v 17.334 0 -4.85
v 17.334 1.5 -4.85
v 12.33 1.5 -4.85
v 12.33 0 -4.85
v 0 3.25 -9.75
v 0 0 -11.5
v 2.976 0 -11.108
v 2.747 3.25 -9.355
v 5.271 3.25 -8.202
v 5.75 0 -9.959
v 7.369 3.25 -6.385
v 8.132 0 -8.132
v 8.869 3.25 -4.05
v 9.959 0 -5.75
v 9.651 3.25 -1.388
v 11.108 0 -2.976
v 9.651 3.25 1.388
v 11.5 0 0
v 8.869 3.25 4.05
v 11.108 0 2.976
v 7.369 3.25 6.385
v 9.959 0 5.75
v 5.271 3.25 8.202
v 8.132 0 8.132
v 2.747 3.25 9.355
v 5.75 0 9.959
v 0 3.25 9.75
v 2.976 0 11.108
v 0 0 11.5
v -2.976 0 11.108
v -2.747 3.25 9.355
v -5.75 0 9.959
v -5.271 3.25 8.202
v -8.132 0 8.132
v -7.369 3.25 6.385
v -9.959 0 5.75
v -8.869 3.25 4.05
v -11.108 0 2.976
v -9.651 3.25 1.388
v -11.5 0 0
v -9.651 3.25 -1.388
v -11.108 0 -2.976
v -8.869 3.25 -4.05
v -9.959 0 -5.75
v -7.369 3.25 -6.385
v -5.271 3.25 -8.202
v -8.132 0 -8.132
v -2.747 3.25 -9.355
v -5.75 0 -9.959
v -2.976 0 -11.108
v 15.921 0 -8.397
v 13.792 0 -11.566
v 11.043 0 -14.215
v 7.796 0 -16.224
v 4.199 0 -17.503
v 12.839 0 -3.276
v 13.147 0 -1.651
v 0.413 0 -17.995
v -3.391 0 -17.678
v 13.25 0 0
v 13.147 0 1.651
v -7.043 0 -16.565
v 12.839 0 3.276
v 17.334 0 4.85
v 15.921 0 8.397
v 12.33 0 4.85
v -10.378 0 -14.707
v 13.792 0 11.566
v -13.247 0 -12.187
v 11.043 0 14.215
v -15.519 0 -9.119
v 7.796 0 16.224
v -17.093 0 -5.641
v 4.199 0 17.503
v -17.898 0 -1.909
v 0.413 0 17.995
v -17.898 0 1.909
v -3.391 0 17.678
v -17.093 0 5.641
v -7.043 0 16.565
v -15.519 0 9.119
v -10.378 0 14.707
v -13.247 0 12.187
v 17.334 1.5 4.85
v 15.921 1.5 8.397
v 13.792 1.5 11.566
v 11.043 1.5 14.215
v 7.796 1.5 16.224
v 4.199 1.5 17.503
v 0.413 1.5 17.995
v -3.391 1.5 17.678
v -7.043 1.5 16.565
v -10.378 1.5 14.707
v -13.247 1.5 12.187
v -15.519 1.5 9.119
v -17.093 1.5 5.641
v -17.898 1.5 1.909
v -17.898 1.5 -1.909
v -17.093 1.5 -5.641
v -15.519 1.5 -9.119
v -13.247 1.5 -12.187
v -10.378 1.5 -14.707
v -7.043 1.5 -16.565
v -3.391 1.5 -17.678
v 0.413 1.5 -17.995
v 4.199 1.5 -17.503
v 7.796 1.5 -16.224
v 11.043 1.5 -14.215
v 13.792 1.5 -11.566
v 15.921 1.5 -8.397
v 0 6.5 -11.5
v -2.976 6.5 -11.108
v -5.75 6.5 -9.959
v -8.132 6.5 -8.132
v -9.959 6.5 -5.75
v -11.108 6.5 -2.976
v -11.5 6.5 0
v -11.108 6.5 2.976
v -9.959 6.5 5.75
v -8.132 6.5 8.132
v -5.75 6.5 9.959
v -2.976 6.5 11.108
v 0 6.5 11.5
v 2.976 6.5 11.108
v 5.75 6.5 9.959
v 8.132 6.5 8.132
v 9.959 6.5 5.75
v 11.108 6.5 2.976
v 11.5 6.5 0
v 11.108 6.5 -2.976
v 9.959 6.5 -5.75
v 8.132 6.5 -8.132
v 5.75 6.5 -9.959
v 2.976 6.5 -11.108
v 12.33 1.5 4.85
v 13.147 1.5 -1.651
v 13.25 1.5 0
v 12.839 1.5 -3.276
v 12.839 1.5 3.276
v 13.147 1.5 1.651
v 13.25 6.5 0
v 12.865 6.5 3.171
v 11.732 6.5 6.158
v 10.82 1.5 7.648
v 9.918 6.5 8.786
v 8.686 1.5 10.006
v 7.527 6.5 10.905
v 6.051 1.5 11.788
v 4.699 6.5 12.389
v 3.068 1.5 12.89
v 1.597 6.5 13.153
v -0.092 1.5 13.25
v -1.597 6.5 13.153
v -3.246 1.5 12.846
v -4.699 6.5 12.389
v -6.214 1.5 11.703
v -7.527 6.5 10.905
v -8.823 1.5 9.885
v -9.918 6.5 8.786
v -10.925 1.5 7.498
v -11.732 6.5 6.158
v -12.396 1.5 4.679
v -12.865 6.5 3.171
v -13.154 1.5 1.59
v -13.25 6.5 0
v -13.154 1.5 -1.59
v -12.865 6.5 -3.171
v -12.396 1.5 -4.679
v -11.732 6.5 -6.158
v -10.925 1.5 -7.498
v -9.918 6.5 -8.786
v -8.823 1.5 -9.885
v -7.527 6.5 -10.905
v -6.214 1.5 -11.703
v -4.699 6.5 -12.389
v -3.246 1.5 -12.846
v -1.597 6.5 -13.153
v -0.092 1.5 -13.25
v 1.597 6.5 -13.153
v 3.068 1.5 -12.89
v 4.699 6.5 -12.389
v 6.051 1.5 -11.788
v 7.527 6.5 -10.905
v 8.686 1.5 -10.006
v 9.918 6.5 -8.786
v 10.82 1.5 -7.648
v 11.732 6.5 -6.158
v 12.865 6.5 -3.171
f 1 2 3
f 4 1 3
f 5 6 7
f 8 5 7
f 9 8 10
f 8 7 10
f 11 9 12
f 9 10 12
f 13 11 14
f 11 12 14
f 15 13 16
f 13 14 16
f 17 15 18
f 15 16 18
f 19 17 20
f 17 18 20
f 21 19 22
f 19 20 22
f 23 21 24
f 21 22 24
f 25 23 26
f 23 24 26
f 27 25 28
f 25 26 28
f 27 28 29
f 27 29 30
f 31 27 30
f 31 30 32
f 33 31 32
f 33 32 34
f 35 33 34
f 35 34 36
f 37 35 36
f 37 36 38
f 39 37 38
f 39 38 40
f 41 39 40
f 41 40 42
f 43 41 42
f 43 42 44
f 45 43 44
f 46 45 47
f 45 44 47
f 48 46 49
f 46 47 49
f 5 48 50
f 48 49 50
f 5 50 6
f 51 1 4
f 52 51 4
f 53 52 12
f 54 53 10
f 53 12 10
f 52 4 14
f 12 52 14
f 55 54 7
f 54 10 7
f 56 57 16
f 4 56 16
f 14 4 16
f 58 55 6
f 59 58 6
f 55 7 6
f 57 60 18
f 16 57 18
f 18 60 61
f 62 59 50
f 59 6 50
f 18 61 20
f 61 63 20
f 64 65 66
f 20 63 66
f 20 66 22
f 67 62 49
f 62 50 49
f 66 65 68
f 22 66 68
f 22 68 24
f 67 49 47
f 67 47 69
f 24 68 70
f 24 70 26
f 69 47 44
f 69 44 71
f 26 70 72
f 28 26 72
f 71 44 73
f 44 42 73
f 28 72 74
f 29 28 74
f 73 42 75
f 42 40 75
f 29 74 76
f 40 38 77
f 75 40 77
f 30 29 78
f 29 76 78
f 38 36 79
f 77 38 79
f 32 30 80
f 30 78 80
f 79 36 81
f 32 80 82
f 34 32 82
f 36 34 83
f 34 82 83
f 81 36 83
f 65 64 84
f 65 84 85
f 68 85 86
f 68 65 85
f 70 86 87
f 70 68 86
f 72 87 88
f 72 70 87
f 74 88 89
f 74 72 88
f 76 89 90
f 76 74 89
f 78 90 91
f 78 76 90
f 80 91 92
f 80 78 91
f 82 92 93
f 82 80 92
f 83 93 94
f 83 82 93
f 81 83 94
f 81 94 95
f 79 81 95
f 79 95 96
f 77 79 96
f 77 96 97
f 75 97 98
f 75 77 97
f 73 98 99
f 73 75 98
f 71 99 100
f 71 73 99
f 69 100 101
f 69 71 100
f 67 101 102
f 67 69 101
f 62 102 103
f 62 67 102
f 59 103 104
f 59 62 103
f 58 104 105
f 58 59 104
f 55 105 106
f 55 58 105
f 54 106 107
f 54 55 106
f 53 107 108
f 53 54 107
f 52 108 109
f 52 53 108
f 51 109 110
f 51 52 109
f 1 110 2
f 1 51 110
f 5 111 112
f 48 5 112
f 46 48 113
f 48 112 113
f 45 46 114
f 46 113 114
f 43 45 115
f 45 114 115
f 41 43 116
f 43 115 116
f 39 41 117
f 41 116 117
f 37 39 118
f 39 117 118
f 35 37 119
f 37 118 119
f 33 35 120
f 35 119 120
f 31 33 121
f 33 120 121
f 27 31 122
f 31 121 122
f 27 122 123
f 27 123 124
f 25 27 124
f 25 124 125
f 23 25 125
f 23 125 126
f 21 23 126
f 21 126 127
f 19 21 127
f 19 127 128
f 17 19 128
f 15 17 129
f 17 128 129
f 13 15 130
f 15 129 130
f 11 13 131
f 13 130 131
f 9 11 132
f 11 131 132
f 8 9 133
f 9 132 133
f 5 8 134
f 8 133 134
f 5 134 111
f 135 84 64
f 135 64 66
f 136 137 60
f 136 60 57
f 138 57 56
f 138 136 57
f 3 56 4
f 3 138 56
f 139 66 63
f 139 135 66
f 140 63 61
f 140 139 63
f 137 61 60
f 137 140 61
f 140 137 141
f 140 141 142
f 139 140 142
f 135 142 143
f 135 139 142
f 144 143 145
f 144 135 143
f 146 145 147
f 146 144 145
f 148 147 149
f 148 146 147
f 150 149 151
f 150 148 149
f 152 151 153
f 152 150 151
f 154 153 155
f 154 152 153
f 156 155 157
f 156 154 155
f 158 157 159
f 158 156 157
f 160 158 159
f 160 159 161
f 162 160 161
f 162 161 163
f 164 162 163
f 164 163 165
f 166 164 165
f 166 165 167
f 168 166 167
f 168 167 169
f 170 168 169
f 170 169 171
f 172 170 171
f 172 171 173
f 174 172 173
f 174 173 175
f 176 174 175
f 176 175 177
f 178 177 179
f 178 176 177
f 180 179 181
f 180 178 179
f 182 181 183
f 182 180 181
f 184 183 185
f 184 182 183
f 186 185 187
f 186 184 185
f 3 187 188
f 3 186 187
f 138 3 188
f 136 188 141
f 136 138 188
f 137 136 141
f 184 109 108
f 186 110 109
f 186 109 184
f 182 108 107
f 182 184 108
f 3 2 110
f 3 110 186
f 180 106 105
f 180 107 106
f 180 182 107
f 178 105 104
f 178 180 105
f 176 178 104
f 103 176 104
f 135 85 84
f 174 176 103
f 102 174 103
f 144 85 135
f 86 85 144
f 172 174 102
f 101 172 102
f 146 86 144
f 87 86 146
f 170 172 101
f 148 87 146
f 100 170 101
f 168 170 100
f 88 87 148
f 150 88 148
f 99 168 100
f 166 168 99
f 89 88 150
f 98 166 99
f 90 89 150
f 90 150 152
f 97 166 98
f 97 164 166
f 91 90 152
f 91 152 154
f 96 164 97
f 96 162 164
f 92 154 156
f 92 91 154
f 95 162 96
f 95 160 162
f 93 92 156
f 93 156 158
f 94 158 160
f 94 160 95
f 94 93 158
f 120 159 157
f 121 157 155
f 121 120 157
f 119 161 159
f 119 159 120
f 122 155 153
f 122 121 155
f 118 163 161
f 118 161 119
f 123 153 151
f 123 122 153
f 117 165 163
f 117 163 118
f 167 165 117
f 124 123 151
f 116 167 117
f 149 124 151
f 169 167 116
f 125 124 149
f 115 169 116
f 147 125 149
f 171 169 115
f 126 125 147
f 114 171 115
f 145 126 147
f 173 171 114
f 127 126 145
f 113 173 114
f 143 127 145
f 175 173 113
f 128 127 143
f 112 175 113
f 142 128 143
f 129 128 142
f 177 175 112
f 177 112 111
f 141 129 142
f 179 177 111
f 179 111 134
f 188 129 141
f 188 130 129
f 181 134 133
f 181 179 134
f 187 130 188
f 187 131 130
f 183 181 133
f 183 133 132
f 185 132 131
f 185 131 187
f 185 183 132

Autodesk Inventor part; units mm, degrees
ref_plane "YZ Plane" through (0, 0, 0) normal (1, 0, 0) x (0, 1, 0)
ref_plane "XZ Plane" through (0, 0, 0) normal (0, 1, 0) x (-1, 0, 0)
ref_plane "XY Plane" through (0, 0, 0) normal (0, 0, 1) x (1, 0, 0)
sketch "Boceto1" plane through (0, 0, 0) normal (0, 1, 0) x (-1, 0, 0)
  circle A0 centre (0, 0) radius 18
  circle A1 centre (0, 0) radius 9.75
  dimension "d0" = 36
  dimension "d1" = 19.5
extrude "Extrusión1" add sketch "Boceto1" along normal blind 1.5
sketch "Boceto2" plane through (0, 1.5, 0) normal (0, 1, 0) x (1, 0, 0)
  circle A0 centre (0, 0) radius 9.75
  circle A1 centre (0, 0) radius 13.25
  dimension "d4" = 26.5
extrude "Extrusión2" add sketch "Boceto2" along normal blind 5
sketch "Boceto3" plane through (0, 1.5, 0) normal (0, 1, 0) x (1, 0, 0)
  circle A0 centre (0, 0) radius 18 projected
  line L0 (18, 0) -> (18, -4.85)
  line L1 (18, -4.85) -> (12.3305, -4.85)
  circle A1 centre (0, 0) radius 13.25 projected
  line L2 (18, 0) -> (18, 4.85)
  line L3 (18, 4.85) -> (12.3305, 4.85)
  point P0 (17.3343, 4.85)
  point P1 (17.3343, -4.85)
  dimension "d7" = 4.85
  dimension "d8" = 4.85
extrude "Extrusión3" cut sketch "Boceto3" against normal through all contours A0 L1 A1 L3 picked at (14.5628, -2.7275)
sketch "Boceto4" plane through (0, 0, 0) normal (0, 0, 1) x (1, 0, 0)
  line L0 (9.75, 6.5) -> (9.75, 0) projected
  line L1 (13.25, 0) -> (13.25, 6.5) projected
  line L2 (13.25, 6.5) -> (9.75, 6.5)
  line L3 (11.5, 6.5) -> (9.75, 3.25)
  line L4 (9.75, 3.25) -> (11.5, 0)
  line L5 (17.3343, 0) -> (-18, 0) projected
  line L6 (11.5, 0) -> (13.25, 0)
  line L7 (11.5, 0) -> (9.75, 0)
  line L8 (9.75, 0) -> (9.75, 6.5)
  line L9 (9.75, 6.5) -> (11.5, 6.5)
  line L10 (13.25, 6.5) -> (-13.25, 6.5) projected
  point P0 (0, 0)
sketch3d "Boceto 3D1"
  arc A0 (9.75, 6.5, 0) -> (0, 6.5, 9.75) centre (0, 6.5, 0) ccw
  arc A1 (0, 6.5, 9.75) -> (-9.75, 6.5, 0) centre (0, 6.5, 0) ccw
  arc A2 (-9.75, 6.5, 0) -> (0, 6.5, -9.75) centre (0, 6.5, 0) ccw
  arc A3 (0, 6.5, -9.75) -> (9.75, 6.5, 0) centre (0, 6.5, 0) ccw
sweep "Barrido1" cut profiles "Boceto4" path "Boceto 3D1" contours L2 L3 L0 | L4 L5 L0
properties part number "Sujección_piezas_sonar"
